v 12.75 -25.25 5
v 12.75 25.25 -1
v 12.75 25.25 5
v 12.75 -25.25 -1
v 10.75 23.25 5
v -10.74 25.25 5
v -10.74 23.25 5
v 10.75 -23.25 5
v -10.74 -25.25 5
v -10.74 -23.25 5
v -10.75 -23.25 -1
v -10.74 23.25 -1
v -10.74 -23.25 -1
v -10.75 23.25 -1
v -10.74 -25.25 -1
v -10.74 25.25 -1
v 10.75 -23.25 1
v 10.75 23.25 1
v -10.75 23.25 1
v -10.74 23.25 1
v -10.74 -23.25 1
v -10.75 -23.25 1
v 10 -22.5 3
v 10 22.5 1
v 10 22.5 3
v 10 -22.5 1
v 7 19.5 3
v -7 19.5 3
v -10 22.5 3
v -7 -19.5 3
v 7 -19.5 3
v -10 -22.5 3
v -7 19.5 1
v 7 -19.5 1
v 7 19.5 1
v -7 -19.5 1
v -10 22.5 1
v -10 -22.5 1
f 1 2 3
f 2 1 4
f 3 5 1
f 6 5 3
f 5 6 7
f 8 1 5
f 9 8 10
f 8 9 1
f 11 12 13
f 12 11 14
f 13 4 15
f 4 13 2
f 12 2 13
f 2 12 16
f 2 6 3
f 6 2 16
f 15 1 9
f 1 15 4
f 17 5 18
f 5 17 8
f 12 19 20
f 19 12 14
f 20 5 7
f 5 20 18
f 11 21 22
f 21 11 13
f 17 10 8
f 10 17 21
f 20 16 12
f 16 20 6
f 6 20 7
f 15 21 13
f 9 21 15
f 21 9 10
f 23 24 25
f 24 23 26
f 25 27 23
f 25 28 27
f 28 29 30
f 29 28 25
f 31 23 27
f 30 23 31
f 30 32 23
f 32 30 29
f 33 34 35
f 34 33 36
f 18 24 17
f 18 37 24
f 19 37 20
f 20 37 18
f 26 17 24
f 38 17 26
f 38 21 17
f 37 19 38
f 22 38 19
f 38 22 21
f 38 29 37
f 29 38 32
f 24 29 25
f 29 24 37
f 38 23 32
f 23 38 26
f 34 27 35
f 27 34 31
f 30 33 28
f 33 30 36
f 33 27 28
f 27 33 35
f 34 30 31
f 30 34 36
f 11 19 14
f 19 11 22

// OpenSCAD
// file: akkum_18650.scad
echo("Работа");

d_akkum = 18;
h_akkum = 65;

twoAcc();

module twoAcc() {
translate([0, -d_akkum/2-1, d_akkum/2+1])
rotate([0, 90, 0])
akkum18650();
    
translate([0, d_akkum/2+1, d_akkum/2+1])
rotate([0, 90, 0])
akkum18650();
    
translate([-33, -10, 0])
import("flexbatter18650x2.stl");
}

module akkum18650(){
    color("purple")
    cylinder(d=d_akkum, h=h_akkum, $fn=32, center = true);
}
// main file
use <akkum_18650.scad>
use <controller.scad>

echo("Работа");

w_back = 70;
h_back = 45;
w_controller = 20;
thickness_bottom = 2;
thickness_walls = 2;
thickness_top = 2;
h_walls = 4;
gap_backlight = 1.5;
width_frame_window = 3;

kit_controller();
//walls();
//debug_controller();

module frame_controller(){
    difference(){
        cube([w_controller, h_back, thickness_top], center=true);
        color("red")
        cube([w_controller-2*width_frame_window, h_back-2*width_frame_window, thickness_top+1], center=true);
    }
}

module debug_controller() {
    difference(){
        kit_controller();
        translate([-w_controller/2, 0, h_walls/2])
        color("green")
        cube([w_controller, h_back+2*thickness_walls+1+gap_backlight, h_walls*2], center = true);
    }
}


module kit_controller(){
    controller();
    translate([0, 0, h_walls/2])
    walls();
    color("purple")
    translate([0, 0, thickness_bottom])
    frame_controller();
}
module walls(){
    difference(){
        cube([w_controller+2*thickness_walls+gap_backlight, h_back+2*thickness_walls+gap_backlight, thickness_bottom+h_walls], center=true);
        color("red")
        cube([w_controller+gap_backlight, h_back+gap_backlight, thickness_bottom+h_walls+1], center=true);
        translate([-w_controller - thickness_walls+gap_backlight/2-0.24, 0, 0])
        cube([w_controller+gap_backlight, h_back+gap_backlight+2*thickness_walls+1, thickness_bottom+h_walls+1], center=true);
    }
}

module controller(){
    cube([w_controller+gap_backlight, h_back+gap_backlight, thickness_bottom], center=true);
}
